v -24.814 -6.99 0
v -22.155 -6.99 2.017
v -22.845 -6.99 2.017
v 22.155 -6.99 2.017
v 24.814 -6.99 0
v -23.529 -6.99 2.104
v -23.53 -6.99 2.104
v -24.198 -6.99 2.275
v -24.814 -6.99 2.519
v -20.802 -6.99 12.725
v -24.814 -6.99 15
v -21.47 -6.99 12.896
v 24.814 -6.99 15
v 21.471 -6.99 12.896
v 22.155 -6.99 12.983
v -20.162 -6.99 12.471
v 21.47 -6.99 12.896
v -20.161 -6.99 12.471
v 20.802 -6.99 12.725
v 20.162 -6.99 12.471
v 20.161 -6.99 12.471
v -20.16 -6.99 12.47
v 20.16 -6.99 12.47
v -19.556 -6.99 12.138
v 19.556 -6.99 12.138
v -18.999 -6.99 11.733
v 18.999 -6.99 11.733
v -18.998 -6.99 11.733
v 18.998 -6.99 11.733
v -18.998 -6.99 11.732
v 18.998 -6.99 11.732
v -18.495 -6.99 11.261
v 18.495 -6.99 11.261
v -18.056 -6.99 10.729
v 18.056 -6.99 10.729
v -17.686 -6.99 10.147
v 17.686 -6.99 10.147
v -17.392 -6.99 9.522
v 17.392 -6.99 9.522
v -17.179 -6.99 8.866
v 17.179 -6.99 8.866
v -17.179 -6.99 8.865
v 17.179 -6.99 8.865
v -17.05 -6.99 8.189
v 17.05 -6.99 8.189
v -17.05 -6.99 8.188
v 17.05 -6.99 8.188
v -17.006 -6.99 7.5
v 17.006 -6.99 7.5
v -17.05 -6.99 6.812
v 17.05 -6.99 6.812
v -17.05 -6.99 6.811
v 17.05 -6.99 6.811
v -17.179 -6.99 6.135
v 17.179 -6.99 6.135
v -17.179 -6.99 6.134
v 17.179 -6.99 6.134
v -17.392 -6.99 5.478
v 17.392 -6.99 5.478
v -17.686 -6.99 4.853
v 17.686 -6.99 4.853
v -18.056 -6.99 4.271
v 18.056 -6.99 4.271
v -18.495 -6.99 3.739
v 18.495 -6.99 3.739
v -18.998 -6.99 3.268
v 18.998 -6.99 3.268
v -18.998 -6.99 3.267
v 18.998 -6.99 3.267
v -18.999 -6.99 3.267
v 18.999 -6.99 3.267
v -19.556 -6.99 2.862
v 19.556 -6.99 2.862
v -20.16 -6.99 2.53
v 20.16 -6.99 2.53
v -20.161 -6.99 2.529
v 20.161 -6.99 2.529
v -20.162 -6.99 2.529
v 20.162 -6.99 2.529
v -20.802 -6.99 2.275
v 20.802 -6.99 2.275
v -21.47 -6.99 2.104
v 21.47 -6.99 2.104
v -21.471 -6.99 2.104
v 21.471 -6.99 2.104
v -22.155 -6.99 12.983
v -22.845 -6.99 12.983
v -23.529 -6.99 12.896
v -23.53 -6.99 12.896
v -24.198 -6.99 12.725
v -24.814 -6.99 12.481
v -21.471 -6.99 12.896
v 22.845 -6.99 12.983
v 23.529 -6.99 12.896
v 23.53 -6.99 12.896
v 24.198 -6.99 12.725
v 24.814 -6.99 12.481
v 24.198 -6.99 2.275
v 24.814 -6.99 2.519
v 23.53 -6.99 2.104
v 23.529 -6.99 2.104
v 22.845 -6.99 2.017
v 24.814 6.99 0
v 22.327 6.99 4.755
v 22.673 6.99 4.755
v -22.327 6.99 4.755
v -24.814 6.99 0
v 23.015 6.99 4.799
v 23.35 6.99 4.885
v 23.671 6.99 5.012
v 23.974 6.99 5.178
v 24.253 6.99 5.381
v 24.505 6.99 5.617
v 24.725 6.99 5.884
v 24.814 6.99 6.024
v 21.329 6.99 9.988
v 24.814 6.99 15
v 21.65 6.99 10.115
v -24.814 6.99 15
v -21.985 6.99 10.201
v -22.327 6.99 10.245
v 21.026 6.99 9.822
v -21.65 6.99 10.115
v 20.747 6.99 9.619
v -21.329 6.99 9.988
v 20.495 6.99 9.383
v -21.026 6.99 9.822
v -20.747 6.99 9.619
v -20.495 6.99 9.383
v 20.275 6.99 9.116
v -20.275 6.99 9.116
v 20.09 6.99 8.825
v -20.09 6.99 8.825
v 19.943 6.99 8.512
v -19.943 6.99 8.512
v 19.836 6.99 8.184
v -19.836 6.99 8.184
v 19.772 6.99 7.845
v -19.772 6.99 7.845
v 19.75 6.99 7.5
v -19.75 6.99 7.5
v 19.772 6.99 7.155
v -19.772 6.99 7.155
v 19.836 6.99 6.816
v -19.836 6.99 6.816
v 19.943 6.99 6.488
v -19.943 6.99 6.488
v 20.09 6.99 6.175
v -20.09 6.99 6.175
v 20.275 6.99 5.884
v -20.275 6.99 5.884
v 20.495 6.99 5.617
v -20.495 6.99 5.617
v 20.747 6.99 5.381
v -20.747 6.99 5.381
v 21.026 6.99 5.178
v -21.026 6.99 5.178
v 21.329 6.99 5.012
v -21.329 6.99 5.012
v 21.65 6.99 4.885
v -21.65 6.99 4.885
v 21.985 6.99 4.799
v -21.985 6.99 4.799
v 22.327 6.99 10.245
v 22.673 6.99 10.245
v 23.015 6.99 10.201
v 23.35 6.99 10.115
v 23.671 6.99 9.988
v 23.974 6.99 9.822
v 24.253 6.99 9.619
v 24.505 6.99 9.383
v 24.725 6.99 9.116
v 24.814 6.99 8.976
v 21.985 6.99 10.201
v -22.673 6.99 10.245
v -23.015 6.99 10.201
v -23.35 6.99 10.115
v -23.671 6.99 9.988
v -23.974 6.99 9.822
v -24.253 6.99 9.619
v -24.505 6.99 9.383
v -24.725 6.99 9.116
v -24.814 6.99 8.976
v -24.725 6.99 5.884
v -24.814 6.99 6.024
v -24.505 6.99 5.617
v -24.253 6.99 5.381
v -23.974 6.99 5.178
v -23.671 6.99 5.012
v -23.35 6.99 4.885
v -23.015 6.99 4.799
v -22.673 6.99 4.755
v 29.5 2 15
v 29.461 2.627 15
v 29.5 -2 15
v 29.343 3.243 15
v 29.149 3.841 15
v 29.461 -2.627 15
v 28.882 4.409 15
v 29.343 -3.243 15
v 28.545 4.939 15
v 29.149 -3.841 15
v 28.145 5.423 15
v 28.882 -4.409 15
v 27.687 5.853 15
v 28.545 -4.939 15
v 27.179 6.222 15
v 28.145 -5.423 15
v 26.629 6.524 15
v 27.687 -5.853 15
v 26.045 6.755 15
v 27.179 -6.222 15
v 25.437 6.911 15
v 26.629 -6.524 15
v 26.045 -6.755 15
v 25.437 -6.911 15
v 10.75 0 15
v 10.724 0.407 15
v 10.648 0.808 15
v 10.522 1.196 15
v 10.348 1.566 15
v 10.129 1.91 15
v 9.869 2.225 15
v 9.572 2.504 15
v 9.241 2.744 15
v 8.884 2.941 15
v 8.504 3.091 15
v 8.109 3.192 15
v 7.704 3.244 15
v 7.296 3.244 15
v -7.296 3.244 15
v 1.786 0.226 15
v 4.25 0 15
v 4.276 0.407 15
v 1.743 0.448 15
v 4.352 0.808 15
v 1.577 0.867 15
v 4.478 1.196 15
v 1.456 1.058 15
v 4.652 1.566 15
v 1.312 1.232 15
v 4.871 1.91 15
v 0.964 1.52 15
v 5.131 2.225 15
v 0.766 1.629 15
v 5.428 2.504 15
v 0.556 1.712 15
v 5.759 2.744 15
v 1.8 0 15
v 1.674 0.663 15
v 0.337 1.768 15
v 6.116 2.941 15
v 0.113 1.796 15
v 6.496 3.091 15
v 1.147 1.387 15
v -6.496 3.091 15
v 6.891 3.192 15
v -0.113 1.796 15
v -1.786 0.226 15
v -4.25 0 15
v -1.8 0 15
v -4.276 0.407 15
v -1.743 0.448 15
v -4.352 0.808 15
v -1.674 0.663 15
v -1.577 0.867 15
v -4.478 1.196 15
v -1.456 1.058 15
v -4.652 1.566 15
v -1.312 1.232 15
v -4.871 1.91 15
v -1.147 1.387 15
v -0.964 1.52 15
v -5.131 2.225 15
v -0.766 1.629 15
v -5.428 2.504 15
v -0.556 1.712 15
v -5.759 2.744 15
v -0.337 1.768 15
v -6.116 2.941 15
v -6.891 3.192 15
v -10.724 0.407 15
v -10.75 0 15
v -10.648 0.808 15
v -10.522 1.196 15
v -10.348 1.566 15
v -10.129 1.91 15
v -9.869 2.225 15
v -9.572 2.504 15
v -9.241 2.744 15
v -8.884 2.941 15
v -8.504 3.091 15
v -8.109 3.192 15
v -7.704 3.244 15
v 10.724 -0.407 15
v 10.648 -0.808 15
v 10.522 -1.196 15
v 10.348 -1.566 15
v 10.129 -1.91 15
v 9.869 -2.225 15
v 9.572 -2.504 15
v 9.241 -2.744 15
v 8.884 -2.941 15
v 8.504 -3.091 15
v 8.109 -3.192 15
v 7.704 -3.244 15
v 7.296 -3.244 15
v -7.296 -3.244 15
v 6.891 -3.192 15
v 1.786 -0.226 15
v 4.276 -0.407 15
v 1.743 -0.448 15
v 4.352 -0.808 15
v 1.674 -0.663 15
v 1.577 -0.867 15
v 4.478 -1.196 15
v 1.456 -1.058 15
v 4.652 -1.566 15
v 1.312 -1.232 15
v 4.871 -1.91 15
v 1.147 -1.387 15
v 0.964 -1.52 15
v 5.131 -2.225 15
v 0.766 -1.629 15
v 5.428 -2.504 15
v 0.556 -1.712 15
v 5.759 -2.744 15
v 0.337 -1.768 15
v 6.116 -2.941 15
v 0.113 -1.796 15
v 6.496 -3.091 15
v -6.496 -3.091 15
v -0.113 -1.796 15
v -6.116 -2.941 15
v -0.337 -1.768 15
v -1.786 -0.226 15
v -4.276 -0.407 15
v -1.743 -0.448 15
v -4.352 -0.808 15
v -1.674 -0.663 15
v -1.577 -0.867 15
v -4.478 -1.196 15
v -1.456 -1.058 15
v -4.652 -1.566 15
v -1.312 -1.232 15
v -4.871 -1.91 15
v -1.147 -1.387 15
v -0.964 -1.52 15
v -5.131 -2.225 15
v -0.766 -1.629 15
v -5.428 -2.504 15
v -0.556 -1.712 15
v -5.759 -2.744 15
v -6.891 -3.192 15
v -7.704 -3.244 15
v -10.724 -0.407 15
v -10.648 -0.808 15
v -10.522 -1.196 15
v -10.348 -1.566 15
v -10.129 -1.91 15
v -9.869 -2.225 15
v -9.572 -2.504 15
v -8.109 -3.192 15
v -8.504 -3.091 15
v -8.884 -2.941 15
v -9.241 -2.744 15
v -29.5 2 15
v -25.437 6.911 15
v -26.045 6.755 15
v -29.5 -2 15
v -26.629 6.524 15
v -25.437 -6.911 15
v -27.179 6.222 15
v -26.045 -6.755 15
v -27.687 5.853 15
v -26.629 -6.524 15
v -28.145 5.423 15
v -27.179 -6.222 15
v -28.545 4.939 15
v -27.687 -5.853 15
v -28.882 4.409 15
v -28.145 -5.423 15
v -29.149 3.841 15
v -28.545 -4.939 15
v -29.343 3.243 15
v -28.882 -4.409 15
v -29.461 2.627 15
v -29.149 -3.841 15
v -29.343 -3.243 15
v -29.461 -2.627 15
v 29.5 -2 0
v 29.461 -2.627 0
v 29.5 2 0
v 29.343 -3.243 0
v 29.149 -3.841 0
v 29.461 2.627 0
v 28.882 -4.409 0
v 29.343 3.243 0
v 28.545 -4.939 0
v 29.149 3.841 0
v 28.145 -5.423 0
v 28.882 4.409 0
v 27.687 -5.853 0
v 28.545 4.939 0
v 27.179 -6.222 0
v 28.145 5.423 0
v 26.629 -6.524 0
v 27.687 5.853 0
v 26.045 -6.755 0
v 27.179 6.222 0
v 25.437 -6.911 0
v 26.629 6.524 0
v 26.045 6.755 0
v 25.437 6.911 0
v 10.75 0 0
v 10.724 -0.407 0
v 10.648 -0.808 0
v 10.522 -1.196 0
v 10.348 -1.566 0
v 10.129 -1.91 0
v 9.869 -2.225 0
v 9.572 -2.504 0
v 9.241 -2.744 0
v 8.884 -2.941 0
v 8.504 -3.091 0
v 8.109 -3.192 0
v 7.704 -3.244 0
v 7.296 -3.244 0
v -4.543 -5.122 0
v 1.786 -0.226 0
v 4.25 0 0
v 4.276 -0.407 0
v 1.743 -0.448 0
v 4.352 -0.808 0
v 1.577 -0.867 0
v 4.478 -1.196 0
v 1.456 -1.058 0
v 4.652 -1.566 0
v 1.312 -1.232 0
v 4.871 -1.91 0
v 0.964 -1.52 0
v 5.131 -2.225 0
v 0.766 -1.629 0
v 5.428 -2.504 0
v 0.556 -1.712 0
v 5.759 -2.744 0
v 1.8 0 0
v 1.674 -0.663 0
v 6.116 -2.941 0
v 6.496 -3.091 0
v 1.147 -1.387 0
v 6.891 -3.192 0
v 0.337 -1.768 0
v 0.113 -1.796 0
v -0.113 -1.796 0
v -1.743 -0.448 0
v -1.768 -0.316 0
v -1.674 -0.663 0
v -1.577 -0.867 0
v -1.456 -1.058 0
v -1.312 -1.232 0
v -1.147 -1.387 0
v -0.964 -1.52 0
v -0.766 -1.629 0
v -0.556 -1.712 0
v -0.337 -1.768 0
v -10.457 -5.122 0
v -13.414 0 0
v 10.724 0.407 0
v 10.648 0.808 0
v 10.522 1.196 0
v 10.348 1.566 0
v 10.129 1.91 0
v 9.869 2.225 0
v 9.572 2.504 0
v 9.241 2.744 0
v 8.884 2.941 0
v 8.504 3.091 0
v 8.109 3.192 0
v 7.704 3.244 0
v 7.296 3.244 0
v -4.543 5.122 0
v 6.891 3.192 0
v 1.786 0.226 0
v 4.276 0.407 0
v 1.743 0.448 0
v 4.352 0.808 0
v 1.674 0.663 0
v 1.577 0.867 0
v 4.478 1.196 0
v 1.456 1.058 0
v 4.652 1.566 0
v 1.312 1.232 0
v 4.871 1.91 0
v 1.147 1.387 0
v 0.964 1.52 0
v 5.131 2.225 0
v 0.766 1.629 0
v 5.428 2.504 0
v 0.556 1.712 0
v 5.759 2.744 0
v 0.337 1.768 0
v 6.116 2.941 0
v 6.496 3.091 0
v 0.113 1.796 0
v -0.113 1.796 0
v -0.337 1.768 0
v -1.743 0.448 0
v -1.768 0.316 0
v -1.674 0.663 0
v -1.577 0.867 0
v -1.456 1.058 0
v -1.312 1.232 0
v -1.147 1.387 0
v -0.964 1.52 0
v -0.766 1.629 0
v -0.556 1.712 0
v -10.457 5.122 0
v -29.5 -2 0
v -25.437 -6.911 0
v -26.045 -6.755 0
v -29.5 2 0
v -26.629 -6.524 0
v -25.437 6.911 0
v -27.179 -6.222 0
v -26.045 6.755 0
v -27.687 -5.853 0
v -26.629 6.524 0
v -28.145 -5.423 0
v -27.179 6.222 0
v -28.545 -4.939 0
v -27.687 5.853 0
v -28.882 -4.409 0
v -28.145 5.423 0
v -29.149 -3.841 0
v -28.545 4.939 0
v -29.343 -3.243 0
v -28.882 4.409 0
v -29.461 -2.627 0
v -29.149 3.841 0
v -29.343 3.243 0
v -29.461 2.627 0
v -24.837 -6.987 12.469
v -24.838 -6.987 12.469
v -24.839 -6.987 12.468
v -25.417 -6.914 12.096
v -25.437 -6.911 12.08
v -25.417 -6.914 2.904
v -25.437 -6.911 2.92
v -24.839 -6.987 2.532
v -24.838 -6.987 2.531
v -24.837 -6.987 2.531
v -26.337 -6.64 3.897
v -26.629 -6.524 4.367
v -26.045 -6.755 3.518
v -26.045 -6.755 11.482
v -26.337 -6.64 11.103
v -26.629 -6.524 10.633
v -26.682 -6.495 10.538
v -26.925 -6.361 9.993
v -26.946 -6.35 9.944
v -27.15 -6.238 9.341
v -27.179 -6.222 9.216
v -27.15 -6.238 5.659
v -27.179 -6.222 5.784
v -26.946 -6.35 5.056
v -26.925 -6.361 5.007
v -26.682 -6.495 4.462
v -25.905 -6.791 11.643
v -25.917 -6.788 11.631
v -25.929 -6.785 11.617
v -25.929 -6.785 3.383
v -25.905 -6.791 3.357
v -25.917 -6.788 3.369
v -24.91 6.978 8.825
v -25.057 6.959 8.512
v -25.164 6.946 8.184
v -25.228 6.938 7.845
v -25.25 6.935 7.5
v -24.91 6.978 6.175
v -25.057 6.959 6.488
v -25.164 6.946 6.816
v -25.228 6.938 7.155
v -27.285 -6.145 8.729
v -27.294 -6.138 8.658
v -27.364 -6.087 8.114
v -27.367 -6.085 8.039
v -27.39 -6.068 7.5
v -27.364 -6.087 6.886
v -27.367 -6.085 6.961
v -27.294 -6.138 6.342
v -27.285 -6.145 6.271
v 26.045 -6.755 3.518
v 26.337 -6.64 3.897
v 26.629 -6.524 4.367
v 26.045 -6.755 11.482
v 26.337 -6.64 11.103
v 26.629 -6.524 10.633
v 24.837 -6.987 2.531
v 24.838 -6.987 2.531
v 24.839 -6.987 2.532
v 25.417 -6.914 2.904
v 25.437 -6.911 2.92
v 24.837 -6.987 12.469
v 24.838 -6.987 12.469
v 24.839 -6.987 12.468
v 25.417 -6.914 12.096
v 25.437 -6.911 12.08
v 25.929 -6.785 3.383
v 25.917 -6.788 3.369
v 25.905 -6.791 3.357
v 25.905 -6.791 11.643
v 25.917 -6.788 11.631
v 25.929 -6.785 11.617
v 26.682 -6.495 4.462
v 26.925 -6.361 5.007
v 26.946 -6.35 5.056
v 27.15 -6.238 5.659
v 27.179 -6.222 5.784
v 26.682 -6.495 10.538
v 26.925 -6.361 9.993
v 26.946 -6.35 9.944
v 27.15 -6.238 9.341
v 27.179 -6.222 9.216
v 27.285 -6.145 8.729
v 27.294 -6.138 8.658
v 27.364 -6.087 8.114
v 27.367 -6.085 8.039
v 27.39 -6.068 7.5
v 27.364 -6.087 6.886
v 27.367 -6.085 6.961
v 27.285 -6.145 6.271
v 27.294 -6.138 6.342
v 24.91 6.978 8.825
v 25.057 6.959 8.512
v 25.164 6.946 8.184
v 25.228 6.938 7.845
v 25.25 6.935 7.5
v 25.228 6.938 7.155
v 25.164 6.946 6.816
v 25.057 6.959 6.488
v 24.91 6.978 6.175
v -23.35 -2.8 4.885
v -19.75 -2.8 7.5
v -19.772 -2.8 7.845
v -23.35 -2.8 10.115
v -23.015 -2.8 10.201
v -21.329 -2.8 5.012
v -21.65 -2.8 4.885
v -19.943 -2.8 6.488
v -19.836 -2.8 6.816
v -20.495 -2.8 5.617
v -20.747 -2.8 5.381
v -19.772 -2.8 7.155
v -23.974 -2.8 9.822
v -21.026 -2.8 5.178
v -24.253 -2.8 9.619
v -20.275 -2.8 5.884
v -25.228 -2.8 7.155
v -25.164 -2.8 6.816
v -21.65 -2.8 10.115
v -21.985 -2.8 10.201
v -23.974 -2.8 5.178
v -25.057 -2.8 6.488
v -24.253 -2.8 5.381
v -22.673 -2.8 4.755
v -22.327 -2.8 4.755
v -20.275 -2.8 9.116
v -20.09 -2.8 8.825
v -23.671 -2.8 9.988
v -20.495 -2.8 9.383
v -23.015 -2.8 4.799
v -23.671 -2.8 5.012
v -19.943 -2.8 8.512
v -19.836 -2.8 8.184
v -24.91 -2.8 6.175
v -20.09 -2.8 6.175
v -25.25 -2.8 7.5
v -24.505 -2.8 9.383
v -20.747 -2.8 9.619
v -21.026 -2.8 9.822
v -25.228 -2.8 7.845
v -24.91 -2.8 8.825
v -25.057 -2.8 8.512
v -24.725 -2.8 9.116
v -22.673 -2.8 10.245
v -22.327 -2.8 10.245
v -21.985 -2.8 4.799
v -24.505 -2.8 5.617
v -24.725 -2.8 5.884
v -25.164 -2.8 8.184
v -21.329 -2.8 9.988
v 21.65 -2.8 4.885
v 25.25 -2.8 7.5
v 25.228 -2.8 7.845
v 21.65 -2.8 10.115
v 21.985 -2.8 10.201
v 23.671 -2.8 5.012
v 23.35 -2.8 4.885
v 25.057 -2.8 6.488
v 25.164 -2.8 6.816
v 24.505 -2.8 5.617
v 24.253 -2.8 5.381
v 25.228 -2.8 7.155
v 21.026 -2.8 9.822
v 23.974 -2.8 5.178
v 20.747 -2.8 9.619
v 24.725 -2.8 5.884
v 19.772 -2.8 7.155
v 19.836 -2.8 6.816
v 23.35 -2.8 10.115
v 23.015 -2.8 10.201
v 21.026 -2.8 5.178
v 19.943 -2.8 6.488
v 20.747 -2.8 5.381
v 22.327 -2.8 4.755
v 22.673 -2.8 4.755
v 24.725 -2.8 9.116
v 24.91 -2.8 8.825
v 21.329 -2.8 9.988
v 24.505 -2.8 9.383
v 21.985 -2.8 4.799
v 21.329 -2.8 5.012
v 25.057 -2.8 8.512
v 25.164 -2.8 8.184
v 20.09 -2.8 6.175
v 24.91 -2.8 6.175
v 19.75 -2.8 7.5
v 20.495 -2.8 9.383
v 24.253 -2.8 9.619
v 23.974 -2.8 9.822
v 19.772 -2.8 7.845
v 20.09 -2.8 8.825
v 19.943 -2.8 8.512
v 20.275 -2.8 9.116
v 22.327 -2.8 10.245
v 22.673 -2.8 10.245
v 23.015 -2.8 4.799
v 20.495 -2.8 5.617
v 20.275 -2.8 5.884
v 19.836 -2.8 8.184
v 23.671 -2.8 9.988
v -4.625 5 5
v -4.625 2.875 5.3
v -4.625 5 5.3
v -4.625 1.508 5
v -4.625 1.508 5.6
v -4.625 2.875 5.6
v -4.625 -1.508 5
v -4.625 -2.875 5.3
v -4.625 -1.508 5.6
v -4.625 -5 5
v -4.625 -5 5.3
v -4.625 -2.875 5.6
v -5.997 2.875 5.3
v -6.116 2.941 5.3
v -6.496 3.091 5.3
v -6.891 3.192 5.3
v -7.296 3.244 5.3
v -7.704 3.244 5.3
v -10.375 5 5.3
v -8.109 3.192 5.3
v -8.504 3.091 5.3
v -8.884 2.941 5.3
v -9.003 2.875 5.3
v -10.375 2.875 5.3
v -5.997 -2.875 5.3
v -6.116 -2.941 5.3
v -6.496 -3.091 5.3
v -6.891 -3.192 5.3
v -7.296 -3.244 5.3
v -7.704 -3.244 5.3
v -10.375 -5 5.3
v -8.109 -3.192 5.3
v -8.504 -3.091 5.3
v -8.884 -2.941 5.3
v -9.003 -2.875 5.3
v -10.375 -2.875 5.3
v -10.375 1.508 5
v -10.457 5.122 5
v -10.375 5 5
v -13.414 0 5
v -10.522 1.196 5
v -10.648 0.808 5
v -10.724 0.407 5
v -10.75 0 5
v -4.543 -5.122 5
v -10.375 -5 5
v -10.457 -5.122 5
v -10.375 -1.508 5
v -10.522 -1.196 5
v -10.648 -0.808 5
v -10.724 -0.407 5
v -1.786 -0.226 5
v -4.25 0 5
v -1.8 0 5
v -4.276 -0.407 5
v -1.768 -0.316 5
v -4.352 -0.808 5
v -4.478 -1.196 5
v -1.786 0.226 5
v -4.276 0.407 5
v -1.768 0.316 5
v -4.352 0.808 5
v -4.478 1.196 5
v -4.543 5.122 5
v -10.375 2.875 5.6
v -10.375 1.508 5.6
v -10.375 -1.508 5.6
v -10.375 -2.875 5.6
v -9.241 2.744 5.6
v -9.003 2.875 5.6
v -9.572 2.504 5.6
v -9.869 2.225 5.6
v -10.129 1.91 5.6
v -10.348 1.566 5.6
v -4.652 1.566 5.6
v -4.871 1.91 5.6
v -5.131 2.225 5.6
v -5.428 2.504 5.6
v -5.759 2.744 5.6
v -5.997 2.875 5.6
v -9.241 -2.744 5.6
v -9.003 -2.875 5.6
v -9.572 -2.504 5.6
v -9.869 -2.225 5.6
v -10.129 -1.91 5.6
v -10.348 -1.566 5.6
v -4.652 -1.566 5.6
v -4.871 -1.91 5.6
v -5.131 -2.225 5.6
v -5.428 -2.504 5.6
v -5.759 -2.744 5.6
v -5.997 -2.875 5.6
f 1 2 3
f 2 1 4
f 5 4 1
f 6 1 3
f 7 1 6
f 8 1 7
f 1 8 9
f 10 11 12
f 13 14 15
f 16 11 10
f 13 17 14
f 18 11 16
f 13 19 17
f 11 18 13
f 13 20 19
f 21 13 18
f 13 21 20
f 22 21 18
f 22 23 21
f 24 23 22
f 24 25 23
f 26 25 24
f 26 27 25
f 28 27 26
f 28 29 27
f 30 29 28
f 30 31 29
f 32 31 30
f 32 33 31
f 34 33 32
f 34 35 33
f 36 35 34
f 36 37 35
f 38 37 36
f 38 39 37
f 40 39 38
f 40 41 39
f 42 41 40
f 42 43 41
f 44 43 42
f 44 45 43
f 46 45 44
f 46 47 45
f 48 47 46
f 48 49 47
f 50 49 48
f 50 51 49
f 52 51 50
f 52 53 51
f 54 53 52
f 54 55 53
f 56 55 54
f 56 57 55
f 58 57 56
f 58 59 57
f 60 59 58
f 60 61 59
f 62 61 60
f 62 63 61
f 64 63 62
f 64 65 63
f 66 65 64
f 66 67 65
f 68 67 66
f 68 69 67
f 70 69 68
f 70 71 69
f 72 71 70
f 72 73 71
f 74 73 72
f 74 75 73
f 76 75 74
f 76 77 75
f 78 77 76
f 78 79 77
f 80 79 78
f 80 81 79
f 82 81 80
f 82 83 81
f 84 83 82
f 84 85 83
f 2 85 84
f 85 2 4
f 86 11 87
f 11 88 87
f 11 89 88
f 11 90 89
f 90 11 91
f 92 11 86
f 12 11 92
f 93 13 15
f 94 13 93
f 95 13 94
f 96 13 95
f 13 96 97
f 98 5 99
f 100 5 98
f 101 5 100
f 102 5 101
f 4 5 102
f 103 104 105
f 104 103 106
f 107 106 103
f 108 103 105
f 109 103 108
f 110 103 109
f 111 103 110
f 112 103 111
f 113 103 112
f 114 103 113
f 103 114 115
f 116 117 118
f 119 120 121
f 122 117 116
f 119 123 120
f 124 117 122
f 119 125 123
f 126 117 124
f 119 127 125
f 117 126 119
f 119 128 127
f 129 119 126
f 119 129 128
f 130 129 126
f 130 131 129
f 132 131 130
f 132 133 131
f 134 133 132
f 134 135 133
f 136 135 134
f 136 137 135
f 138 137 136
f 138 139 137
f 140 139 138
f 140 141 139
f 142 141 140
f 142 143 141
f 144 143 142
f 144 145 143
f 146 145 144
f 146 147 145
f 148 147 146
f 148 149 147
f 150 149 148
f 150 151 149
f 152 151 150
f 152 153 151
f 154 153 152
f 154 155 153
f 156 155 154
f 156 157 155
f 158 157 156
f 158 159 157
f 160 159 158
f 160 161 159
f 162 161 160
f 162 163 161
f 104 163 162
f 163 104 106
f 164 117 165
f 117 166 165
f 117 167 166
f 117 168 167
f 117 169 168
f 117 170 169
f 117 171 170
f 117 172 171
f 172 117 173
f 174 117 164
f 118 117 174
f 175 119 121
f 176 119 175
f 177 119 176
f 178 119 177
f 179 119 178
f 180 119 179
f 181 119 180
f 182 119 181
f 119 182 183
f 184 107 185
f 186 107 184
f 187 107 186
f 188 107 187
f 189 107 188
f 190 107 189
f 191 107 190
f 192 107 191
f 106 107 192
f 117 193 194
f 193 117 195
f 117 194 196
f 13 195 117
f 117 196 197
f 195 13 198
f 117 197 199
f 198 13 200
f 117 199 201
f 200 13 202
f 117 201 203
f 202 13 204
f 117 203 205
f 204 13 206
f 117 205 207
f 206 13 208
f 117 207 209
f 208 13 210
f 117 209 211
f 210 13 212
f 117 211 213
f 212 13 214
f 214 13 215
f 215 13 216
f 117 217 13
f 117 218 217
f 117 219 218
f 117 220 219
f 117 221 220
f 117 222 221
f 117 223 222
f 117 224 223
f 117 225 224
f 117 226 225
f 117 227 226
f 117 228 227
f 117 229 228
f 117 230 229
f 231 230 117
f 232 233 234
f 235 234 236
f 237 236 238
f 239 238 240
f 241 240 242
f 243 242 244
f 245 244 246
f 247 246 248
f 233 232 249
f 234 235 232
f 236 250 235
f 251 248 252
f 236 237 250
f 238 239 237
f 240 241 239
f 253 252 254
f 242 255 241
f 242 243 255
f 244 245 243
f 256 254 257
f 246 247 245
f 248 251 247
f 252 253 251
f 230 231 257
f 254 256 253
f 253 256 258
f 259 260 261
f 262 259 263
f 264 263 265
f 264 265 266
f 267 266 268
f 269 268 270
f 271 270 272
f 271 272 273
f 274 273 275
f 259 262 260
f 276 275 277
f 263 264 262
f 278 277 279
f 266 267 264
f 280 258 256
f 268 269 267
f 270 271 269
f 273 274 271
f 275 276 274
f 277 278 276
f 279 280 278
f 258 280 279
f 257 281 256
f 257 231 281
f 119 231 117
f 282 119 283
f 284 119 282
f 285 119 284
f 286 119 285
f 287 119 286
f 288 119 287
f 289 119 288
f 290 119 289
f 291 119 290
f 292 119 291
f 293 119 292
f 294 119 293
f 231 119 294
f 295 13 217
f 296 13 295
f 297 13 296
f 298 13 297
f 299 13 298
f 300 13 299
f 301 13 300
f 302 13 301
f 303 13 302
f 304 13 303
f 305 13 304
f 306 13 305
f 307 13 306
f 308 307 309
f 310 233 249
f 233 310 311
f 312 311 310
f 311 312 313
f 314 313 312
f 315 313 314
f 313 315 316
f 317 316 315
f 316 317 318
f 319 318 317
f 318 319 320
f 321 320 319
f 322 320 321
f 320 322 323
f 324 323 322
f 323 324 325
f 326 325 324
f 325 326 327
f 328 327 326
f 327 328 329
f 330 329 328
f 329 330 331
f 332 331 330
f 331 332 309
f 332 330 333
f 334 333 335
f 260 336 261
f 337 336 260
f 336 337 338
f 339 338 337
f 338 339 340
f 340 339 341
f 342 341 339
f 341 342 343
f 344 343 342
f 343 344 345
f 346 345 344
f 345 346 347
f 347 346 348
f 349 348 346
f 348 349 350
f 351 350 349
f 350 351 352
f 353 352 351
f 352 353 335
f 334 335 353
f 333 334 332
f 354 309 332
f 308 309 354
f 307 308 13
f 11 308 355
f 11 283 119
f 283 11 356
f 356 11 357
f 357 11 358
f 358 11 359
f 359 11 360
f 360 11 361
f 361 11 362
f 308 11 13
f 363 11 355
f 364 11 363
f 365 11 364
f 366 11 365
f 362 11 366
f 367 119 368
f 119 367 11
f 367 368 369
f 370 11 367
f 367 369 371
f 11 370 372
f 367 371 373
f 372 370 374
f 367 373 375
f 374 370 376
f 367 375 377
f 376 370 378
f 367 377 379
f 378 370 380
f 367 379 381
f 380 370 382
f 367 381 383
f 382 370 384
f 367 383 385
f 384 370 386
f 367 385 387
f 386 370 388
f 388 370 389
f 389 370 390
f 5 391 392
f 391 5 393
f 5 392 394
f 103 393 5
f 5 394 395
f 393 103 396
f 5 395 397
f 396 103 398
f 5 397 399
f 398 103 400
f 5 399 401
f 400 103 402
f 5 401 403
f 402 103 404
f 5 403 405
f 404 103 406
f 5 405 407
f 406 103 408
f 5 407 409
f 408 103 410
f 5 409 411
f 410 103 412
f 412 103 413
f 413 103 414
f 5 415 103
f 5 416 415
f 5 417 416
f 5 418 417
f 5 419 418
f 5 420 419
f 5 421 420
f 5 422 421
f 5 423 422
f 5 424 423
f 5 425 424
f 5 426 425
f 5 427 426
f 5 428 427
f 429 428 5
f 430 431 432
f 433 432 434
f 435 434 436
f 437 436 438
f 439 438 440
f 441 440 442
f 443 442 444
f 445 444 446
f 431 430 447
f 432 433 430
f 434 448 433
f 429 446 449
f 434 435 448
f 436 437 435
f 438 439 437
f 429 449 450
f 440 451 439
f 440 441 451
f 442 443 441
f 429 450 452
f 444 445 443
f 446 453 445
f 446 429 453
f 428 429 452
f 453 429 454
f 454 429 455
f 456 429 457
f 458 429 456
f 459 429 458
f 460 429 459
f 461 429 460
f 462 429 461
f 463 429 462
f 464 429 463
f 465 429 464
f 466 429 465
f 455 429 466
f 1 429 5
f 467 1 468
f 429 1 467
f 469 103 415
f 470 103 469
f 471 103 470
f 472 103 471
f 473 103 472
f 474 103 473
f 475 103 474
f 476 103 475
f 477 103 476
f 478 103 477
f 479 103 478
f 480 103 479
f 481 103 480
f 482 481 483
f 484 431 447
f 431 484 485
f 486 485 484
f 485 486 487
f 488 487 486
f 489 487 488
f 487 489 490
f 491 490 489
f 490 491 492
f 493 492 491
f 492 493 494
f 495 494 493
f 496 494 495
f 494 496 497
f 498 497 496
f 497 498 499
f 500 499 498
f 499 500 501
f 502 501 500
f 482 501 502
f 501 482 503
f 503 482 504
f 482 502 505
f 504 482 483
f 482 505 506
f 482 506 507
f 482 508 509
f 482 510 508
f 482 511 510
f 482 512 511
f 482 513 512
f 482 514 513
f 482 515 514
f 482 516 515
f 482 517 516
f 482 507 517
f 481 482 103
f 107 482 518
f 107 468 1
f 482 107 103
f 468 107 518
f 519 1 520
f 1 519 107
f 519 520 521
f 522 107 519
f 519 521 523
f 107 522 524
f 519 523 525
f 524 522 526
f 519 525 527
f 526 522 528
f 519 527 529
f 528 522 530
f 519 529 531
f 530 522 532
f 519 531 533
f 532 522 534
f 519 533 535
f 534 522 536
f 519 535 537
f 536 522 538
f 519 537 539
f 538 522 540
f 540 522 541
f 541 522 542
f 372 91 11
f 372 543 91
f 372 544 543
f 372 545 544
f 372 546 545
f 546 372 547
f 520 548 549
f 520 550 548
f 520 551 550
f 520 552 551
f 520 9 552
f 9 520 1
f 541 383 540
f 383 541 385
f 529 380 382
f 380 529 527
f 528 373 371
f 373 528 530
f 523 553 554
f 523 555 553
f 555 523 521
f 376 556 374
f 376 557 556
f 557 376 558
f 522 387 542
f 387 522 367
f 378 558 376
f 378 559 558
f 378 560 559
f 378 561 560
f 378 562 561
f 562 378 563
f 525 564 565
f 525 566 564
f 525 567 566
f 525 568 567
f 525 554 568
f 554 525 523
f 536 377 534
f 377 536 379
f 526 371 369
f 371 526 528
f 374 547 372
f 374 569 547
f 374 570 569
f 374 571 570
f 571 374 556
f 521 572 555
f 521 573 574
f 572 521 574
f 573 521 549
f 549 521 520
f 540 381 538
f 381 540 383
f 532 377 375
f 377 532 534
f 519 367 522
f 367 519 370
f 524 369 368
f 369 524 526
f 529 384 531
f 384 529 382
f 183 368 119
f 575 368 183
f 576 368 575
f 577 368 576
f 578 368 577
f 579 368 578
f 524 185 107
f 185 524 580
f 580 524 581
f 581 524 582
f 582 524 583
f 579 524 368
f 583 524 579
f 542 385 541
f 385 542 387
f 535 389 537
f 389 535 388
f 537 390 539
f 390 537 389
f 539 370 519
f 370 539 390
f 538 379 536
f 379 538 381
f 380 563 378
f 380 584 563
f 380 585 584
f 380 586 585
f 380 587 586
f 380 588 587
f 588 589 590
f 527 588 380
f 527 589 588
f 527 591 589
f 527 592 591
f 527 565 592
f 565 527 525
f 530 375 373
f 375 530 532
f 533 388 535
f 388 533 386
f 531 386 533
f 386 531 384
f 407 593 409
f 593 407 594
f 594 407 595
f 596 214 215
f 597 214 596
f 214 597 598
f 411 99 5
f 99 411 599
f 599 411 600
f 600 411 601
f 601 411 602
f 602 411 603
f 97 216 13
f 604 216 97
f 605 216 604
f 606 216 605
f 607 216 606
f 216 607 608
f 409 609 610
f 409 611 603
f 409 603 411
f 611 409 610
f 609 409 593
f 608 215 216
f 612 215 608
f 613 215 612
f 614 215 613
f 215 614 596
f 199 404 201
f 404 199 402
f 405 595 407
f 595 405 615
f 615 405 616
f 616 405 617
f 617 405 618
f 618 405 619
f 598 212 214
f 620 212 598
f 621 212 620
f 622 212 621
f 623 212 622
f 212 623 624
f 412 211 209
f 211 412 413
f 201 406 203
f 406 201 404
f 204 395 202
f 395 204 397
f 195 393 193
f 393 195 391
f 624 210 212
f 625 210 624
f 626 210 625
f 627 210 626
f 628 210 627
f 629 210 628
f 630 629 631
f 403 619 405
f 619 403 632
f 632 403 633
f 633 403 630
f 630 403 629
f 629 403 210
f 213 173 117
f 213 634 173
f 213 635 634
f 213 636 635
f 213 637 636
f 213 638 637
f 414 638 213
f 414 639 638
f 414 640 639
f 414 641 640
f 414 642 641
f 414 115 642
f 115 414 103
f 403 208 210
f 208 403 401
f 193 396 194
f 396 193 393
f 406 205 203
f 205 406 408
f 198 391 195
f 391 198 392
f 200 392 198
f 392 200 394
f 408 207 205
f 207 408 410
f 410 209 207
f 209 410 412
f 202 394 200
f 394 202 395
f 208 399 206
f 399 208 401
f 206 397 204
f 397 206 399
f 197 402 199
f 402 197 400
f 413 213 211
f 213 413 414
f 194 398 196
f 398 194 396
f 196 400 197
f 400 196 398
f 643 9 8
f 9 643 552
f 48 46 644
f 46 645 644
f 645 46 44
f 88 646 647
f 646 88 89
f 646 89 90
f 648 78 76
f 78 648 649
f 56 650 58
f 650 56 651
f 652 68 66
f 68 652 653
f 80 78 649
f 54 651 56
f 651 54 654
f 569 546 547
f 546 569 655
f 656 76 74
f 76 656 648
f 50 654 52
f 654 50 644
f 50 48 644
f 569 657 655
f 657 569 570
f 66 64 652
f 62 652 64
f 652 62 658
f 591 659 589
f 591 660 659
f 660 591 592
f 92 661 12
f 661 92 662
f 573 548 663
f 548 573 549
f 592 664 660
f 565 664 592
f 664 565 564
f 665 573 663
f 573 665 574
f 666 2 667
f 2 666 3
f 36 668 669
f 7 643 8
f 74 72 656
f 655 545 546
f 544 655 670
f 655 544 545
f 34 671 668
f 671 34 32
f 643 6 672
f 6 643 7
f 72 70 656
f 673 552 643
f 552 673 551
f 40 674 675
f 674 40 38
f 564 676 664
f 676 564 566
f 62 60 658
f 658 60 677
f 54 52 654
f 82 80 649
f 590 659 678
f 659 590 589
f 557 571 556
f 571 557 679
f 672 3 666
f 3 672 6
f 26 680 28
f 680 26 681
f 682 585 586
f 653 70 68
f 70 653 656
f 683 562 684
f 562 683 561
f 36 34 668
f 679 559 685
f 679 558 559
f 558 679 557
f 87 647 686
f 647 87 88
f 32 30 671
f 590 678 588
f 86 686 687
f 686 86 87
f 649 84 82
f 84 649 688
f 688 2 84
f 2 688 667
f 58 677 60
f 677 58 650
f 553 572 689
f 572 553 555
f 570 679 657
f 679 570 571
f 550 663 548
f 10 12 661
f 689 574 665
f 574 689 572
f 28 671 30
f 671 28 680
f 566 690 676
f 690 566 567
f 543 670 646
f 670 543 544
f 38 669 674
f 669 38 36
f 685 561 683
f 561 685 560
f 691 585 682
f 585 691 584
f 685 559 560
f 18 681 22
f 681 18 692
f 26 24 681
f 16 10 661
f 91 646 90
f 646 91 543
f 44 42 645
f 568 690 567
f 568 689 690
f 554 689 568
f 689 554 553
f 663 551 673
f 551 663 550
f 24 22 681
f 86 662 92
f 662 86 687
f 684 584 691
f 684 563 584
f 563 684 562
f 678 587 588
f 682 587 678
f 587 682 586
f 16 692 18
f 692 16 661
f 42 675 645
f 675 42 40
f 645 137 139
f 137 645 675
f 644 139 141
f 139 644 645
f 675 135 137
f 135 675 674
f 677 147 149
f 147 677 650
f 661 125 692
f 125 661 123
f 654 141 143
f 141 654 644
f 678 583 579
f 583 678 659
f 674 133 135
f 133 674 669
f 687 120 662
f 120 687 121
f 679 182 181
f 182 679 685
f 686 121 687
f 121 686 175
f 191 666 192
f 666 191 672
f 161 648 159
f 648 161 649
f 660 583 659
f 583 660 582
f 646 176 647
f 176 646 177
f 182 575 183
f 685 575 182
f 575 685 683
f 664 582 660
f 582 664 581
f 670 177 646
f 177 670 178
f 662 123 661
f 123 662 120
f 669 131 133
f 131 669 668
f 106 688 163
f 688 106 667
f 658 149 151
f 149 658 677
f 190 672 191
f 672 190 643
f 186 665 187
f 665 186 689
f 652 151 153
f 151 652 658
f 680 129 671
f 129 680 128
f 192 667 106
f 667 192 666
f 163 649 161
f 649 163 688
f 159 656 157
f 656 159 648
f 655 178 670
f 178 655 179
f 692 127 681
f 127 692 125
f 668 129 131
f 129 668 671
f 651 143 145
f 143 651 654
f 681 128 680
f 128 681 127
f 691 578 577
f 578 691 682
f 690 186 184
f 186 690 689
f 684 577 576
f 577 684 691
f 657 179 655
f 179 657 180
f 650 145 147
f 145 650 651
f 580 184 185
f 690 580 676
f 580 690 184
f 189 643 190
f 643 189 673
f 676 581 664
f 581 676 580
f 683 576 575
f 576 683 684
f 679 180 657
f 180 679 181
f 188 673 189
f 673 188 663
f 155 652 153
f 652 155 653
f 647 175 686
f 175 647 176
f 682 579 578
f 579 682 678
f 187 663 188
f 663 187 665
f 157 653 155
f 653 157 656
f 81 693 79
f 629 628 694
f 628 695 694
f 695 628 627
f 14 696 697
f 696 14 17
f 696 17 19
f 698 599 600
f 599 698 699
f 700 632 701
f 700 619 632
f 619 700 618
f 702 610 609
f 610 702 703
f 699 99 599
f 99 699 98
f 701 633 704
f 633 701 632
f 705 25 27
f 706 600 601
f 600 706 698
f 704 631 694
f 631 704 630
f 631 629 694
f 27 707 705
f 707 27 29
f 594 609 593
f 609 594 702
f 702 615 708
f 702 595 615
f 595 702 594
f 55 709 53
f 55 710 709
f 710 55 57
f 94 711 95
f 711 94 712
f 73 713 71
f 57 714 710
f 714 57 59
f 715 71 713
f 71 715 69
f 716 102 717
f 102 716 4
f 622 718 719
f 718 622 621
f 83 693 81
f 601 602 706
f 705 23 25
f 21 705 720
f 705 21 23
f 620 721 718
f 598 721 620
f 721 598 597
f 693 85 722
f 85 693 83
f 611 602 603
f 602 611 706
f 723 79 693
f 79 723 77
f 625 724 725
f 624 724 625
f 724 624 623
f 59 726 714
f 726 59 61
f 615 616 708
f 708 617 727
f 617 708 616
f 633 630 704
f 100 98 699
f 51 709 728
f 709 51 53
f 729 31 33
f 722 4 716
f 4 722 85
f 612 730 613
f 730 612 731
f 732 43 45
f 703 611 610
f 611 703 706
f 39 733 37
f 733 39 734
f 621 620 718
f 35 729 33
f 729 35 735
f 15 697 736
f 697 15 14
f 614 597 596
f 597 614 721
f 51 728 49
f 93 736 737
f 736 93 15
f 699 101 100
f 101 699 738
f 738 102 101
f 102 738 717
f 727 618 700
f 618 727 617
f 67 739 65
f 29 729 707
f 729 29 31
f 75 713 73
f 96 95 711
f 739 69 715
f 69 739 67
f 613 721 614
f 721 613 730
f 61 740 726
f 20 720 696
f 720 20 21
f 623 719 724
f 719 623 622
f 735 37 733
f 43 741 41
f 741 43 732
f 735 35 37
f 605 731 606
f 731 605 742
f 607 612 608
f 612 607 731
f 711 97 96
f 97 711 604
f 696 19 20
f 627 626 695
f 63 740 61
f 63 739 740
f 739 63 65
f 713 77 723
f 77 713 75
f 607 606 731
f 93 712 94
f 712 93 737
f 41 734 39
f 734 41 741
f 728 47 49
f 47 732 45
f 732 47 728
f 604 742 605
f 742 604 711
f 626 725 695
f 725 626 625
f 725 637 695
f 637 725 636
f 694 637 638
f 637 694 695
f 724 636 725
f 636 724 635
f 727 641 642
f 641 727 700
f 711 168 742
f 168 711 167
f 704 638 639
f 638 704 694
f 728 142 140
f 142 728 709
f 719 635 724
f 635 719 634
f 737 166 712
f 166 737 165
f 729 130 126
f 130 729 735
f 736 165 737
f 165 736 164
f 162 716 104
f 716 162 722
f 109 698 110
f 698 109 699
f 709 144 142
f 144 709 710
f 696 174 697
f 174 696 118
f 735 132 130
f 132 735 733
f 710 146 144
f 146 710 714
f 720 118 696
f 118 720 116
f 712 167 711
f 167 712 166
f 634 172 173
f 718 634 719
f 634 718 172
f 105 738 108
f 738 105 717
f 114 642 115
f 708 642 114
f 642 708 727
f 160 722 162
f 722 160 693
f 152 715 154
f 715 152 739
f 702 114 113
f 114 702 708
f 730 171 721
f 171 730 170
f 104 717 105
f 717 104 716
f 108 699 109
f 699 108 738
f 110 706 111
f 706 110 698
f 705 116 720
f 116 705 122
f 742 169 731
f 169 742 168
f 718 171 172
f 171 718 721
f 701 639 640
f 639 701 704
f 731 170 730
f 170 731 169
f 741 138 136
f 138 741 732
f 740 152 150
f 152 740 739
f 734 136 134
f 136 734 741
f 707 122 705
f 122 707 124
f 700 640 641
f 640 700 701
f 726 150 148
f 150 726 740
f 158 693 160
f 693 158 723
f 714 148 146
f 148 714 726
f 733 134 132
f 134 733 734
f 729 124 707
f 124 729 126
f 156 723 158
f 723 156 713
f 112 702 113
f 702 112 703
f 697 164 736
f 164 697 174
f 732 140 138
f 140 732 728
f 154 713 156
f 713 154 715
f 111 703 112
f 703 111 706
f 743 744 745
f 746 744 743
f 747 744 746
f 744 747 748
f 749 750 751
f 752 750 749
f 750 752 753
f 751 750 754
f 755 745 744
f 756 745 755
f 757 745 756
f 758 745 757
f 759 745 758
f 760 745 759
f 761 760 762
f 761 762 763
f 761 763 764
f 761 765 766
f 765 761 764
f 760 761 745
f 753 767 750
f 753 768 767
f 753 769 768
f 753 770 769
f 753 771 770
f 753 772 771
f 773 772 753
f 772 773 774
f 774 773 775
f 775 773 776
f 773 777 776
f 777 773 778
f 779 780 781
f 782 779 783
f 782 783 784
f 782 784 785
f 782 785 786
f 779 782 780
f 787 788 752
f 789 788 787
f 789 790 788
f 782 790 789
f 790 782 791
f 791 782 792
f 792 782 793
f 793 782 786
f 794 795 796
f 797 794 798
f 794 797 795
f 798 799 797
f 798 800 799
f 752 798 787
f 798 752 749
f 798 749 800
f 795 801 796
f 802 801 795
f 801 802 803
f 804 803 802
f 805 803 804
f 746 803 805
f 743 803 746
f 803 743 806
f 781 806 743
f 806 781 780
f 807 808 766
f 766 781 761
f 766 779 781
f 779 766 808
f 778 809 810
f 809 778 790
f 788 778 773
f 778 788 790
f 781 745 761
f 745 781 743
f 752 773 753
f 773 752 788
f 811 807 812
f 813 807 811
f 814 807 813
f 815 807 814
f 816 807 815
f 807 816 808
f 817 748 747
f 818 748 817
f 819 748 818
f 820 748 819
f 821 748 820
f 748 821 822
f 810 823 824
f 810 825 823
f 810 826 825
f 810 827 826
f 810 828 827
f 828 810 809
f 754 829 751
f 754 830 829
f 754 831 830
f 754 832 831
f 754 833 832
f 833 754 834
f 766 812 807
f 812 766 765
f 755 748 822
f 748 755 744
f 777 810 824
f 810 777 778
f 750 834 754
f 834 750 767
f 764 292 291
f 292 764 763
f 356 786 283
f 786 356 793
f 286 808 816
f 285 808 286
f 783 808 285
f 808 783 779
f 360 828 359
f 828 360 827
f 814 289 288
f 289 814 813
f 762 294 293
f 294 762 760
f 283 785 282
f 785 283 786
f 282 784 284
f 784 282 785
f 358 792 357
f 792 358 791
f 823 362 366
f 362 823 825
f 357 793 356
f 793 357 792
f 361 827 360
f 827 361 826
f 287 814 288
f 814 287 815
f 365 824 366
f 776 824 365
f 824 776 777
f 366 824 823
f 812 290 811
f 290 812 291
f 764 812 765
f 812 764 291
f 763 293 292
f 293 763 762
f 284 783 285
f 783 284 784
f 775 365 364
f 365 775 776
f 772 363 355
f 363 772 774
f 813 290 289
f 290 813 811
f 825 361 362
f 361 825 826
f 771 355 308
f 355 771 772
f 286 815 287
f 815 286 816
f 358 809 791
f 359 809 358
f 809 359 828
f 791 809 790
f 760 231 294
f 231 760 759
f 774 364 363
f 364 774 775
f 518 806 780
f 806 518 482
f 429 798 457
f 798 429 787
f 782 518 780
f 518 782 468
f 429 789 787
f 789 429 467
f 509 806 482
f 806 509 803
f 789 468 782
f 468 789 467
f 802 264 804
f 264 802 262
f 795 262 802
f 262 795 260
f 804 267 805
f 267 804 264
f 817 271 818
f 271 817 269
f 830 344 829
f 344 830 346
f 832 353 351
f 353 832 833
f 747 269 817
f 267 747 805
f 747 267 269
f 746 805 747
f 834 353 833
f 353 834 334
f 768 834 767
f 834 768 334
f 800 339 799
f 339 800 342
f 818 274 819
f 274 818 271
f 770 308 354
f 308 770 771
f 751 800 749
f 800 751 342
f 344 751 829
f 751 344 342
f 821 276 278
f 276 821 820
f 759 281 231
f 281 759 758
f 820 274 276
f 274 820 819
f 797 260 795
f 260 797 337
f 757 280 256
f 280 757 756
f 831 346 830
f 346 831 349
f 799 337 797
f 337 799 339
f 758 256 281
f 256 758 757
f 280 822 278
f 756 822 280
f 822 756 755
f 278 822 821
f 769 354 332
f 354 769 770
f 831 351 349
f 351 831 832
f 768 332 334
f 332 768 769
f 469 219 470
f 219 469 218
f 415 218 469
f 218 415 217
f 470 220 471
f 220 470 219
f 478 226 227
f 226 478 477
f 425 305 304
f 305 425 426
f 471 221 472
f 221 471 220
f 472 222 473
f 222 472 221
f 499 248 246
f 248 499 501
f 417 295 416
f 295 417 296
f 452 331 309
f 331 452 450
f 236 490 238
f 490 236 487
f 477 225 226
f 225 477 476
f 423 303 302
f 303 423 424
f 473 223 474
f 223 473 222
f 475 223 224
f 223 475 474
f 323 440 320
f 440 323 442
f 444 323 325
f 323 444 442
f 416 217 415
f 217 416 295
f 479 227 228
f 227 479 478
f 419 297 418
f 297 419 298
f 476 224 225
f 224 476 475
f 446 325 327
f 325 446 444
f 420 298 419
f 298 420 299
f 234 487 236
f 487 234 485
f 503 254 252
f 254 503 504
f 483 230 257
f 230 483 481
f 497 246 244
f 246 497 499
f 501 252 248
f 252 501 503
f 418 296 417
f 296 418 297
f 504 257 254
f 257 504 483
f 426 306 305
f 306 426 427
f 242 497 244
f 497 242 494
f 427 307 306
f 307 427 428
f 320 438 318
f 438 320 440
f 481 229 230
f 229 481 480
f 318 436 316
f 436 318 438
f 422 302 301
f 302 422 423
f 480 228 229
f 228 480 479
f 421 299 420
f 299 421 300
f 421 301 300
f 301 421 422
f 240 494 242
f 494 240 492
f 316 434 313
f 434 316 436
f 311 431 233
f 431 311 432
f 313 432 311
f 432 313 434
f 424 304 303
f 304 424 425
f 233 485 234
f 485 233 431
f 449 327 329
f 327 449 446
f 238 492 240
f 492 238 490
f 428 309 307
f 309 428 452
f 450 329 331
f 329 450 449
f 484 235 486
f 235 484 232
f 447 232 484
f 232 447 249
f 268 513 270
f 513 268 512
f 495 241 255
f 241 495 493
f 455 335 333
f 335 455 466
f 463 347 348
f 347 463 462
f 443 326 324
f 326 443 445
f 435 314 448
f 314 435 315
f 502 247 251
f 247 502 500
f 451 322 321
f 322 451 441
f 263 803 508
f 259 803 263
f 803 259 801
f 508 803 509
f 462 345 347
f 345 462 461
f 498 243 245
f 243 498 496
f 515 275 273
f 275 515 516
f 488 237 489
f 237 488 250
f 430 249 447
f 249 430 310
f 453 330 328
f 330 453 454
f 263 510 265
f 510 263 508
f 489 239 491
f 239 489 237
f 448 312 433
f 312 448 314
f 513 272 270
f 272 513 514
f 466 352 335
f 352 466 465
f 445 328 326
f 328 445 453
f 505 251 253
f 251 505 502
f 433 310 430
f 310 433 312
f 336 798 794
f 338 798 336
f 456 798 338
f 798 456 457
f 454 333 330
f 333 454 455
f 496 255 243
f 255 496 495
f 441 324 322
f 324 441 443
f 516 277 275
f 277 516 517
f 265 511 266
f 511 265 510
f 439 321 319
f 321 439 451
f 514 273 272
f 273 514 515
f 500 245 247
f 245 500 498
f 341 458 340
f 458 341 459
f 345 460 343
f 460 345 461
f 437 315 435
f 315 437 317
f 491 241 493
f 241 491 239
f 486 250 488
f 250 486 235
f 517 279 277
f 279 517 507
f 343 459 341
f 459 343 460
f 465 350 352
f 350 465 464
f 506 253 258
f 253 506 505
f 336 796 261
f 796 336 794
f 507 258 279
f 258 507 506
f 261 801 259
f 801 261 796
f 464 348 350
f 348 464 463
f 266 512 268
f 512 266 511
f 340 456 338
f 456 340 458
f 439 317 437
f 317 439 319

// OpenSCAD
$fn = 50;


difference() {
	union() {
		hull() {
			translate(v = [-9.5000000000, 2.0000000000, 0]) {
				cylinder(h = 15, r = 5);
			}
			translate(v = [9.5000000000, 2.0000000000, 0]) {
				cylinder(h = 15, r = 5);
			}
			translate(v = [-9.5000000000, -2.0000000000, 0]) {
				cylinder(h = 15, r = 5);
			}
			translate(v = [9.5000000000, -2.0000000000, 0]) {
				cylinder(h = 15, r = 5);
			}
		}
		translate(v = [-15.0000000000, 0.0000000000, 0]) {
			hull() {
				translate(v = [-9.5000000000, 2.0000000000, 0]) {
					cylinder(h = 15, r = 5);
				}
				translate(v = [9.5000000000, 2.0000000000, 0]) {
					cylinder(h = 15, r = 5);
				}
				translate(v = [-9.5000000000, -2.0000000000, 0]) {
					cylinder(h = 15, r = 5);
				}
				translate(v = [9.5000000000, -2.0000000000, 0]) {
					cylinder(h = 15, r = 5);
				}
			}
		}
		translate(v = [15.0000000000, 0.0000000000, 0]) {
			hull() {
				translate(v = [-9.5000000000, 2.0000000000, 0]) {
					cylinder(h = 15, r = 5);
				}
				translate(v = [9.5000000000, 2.0000000000, 0]) {
					cylinder(h = 15, r = 5);
				}
				translate(v = [-9.5000000000, -2.0000000000, 0]) {
					cylinder(h = 15, r = 5);
				}
				translate(v = [9.5000000000, -2.0000000000, 0]) {
					cylinder(h = 15, r = 5);
				}
			}
		}
	}
	union() {
		translate(v = [-22.5000000000, -7.0000000000, 7.5000000000]) {
			rotate(a = [90, 0, 0]) {
				difference() {
					union() {
						#translate(v = [0, 0, -14.0000000000]) {
							cylinder(h = 14, r = 2.2500000000);
						}
						#translate(v = [0, 0, -4.2000000000]) {
							cylinder(h = 4.2000000000, r1 = 2.7500000000, r2 = 5.5000000000);
						}
						#translate(v = [0, 0, -14.0000000000]) {
							cylinder(h = 14, r = 2.7500000000);
						}
						#translate(v = [0, 0, -14.0000000000]) {
							cylinder(h = 14, r = 2.2500000000);
						}
					}
					union();
				}
			}
		}
		translate(v = [22.5000000000, -7.0000000000, 7.5000000000]) {
			rotate(a = [90, 0, 0]) {
				difference() {
					union() {
						#translate(v = [0, 0, -14.0000000000]) {
							cylinder(h = 14, r = 2.2500000000);
						}
						#translate(v = [0, 0, -4.2000000000]) {
							cylinder(h = 4.2000000000, r1 = 2.7500000000, r2 = 5.5000000000);
						}
						#translate(v = [0, 0, -14.0000000000]) {
							cylinder(h = 14, r = 2.7500000000);
						}
						#translate(v = [0, 0, -14.0000000000]) {
							cylinder(h = 14, r = 2.2500000000);
						}
					}
					union();
				}
			}
		}
		translate(v = [-7.5000000000, 0.0000000000, 0]) {
			rotate(a = [0, 0, 0]) {
				difference() {
					union() {
						#translate(v = [-2.8750000000, -5.0000000000, -0.3000000000]) {
							cube(size = [5.7500000000, 10, 0.3000000000]);
						}
						#translate(v = [-2.8750000000, -2.8750000000, -0.6000000000]) {
							cube(size = [5.7500000000, 5.7500000000, 0.3000000000]);
						}
						#translate(v = [-2.8750000000, -5.0000000000, 5]) {
							cube(size = [5.7500000000, 10, 0.3000000000]);
						}
						#translate(v = [-2.8750000000, -2.8750000000, 5.3000000000]) {
							cube(size = [5.7500000000, 5.7500000000, 0.3000000000]);
						}
						#translate(v = [0, 0, -100.0000000000]) {
							cylinder(h = 200, r = 3.2500000000);
						}
						#linear_extrude(height = 5) {
							polygon(points = [[5.9142500000, 0.0000000000], [2.9571250000, 5.1218907443], [-2.9571250000, 5.1218907443], [-5.9142500000, 0.0000000000], [-2.9571250000, -5.1218907443], [2.9571250000, -5.1218907443]]);
						}
						#translate(v = [-2.8750000000, -5.0000000000, -0.3000000000]) {
							cube(size = [5.7500000000, 10, 0.3000000000]);
						}
						#translate(v = [-2.8750000000, -2.8750000000, -0.6000000000]) {
							cube(size = [5.7500000000, 5.7500000000, 0.3000000000]);
						}
						#translate(v = [-2.8750000000, -5.0000000000, 5]) {
							cube(size = [5.7500000000, 10, 0.3000000000]);
						}
						#translate(v = [-2.8750000000, -2.8750000000, 5.3000000000]) {
							cube(size = [5.7500000000, 5.7500000000, 0.3000000000]);
						}
						#translate(v = [0, 0, -100.0000000000]) {
							cylinder(h = 200, r = 3.2500000000);
						}
						#translate(v = [-2.8750000000, -5.0000000000, -0.3000000000]) {
							cube(size = [5.7500000000, 10, 0.3000000000]);
						}
						#translate(v = [-2.8750000000, -2.8750000000, -0.6000000000]) {
							cube(size = [5.7500000000, 5.7500000000, 0.3000000000]);
						}
						#translate(v = [-2.8750000000, -5.0000000000, 5]) {
							cube(size = [5.7500000000, 10, 0.3000000000]);
						}
						#translate(v = [-2.8750000000, -2.8750000000, 5.3000000000]) {
							cube(size = [5.7500000000, 5.7500000000, 0.3000000000]);
						}
						#translate(v = [0, 0, -100.0000000000]) {
							cylinder(h = 200, r = 3.2500000000);
						}
					}
					union();
				}
			}
		}
		translate(v = [-7.5000000000, 0.0000000000, 0]) {
			translate(v = [0, 0, -100]) {
				cylinder(h = 200, r = 3.2500000000);
			}
		}
		translate(v = [7.5000000000, 0.0000000000, 0]) {
			translate(v = [0, 0, -100]) {
				cylinder(h = 200, r = 3.2500000000);
			}
		}
		translate(v = [-7.5000000000, 0.0000000000, 0]) {
			translate(v = [0, 0, -100]) {
				cylinder(h = 200, r = 1.8000000000);
			}
		}
		translate(v = [0, 0, -100]) {
			cylinder(h = 200, r = 1.8000000000);
		}
		translate(v = [7.5000000000, 0.0000000000, 0]) {
			translate(v = [0, 0, -100]) {
				cylinder(h = 200, r = 1.8000000000);
			}
		}
	}
}
